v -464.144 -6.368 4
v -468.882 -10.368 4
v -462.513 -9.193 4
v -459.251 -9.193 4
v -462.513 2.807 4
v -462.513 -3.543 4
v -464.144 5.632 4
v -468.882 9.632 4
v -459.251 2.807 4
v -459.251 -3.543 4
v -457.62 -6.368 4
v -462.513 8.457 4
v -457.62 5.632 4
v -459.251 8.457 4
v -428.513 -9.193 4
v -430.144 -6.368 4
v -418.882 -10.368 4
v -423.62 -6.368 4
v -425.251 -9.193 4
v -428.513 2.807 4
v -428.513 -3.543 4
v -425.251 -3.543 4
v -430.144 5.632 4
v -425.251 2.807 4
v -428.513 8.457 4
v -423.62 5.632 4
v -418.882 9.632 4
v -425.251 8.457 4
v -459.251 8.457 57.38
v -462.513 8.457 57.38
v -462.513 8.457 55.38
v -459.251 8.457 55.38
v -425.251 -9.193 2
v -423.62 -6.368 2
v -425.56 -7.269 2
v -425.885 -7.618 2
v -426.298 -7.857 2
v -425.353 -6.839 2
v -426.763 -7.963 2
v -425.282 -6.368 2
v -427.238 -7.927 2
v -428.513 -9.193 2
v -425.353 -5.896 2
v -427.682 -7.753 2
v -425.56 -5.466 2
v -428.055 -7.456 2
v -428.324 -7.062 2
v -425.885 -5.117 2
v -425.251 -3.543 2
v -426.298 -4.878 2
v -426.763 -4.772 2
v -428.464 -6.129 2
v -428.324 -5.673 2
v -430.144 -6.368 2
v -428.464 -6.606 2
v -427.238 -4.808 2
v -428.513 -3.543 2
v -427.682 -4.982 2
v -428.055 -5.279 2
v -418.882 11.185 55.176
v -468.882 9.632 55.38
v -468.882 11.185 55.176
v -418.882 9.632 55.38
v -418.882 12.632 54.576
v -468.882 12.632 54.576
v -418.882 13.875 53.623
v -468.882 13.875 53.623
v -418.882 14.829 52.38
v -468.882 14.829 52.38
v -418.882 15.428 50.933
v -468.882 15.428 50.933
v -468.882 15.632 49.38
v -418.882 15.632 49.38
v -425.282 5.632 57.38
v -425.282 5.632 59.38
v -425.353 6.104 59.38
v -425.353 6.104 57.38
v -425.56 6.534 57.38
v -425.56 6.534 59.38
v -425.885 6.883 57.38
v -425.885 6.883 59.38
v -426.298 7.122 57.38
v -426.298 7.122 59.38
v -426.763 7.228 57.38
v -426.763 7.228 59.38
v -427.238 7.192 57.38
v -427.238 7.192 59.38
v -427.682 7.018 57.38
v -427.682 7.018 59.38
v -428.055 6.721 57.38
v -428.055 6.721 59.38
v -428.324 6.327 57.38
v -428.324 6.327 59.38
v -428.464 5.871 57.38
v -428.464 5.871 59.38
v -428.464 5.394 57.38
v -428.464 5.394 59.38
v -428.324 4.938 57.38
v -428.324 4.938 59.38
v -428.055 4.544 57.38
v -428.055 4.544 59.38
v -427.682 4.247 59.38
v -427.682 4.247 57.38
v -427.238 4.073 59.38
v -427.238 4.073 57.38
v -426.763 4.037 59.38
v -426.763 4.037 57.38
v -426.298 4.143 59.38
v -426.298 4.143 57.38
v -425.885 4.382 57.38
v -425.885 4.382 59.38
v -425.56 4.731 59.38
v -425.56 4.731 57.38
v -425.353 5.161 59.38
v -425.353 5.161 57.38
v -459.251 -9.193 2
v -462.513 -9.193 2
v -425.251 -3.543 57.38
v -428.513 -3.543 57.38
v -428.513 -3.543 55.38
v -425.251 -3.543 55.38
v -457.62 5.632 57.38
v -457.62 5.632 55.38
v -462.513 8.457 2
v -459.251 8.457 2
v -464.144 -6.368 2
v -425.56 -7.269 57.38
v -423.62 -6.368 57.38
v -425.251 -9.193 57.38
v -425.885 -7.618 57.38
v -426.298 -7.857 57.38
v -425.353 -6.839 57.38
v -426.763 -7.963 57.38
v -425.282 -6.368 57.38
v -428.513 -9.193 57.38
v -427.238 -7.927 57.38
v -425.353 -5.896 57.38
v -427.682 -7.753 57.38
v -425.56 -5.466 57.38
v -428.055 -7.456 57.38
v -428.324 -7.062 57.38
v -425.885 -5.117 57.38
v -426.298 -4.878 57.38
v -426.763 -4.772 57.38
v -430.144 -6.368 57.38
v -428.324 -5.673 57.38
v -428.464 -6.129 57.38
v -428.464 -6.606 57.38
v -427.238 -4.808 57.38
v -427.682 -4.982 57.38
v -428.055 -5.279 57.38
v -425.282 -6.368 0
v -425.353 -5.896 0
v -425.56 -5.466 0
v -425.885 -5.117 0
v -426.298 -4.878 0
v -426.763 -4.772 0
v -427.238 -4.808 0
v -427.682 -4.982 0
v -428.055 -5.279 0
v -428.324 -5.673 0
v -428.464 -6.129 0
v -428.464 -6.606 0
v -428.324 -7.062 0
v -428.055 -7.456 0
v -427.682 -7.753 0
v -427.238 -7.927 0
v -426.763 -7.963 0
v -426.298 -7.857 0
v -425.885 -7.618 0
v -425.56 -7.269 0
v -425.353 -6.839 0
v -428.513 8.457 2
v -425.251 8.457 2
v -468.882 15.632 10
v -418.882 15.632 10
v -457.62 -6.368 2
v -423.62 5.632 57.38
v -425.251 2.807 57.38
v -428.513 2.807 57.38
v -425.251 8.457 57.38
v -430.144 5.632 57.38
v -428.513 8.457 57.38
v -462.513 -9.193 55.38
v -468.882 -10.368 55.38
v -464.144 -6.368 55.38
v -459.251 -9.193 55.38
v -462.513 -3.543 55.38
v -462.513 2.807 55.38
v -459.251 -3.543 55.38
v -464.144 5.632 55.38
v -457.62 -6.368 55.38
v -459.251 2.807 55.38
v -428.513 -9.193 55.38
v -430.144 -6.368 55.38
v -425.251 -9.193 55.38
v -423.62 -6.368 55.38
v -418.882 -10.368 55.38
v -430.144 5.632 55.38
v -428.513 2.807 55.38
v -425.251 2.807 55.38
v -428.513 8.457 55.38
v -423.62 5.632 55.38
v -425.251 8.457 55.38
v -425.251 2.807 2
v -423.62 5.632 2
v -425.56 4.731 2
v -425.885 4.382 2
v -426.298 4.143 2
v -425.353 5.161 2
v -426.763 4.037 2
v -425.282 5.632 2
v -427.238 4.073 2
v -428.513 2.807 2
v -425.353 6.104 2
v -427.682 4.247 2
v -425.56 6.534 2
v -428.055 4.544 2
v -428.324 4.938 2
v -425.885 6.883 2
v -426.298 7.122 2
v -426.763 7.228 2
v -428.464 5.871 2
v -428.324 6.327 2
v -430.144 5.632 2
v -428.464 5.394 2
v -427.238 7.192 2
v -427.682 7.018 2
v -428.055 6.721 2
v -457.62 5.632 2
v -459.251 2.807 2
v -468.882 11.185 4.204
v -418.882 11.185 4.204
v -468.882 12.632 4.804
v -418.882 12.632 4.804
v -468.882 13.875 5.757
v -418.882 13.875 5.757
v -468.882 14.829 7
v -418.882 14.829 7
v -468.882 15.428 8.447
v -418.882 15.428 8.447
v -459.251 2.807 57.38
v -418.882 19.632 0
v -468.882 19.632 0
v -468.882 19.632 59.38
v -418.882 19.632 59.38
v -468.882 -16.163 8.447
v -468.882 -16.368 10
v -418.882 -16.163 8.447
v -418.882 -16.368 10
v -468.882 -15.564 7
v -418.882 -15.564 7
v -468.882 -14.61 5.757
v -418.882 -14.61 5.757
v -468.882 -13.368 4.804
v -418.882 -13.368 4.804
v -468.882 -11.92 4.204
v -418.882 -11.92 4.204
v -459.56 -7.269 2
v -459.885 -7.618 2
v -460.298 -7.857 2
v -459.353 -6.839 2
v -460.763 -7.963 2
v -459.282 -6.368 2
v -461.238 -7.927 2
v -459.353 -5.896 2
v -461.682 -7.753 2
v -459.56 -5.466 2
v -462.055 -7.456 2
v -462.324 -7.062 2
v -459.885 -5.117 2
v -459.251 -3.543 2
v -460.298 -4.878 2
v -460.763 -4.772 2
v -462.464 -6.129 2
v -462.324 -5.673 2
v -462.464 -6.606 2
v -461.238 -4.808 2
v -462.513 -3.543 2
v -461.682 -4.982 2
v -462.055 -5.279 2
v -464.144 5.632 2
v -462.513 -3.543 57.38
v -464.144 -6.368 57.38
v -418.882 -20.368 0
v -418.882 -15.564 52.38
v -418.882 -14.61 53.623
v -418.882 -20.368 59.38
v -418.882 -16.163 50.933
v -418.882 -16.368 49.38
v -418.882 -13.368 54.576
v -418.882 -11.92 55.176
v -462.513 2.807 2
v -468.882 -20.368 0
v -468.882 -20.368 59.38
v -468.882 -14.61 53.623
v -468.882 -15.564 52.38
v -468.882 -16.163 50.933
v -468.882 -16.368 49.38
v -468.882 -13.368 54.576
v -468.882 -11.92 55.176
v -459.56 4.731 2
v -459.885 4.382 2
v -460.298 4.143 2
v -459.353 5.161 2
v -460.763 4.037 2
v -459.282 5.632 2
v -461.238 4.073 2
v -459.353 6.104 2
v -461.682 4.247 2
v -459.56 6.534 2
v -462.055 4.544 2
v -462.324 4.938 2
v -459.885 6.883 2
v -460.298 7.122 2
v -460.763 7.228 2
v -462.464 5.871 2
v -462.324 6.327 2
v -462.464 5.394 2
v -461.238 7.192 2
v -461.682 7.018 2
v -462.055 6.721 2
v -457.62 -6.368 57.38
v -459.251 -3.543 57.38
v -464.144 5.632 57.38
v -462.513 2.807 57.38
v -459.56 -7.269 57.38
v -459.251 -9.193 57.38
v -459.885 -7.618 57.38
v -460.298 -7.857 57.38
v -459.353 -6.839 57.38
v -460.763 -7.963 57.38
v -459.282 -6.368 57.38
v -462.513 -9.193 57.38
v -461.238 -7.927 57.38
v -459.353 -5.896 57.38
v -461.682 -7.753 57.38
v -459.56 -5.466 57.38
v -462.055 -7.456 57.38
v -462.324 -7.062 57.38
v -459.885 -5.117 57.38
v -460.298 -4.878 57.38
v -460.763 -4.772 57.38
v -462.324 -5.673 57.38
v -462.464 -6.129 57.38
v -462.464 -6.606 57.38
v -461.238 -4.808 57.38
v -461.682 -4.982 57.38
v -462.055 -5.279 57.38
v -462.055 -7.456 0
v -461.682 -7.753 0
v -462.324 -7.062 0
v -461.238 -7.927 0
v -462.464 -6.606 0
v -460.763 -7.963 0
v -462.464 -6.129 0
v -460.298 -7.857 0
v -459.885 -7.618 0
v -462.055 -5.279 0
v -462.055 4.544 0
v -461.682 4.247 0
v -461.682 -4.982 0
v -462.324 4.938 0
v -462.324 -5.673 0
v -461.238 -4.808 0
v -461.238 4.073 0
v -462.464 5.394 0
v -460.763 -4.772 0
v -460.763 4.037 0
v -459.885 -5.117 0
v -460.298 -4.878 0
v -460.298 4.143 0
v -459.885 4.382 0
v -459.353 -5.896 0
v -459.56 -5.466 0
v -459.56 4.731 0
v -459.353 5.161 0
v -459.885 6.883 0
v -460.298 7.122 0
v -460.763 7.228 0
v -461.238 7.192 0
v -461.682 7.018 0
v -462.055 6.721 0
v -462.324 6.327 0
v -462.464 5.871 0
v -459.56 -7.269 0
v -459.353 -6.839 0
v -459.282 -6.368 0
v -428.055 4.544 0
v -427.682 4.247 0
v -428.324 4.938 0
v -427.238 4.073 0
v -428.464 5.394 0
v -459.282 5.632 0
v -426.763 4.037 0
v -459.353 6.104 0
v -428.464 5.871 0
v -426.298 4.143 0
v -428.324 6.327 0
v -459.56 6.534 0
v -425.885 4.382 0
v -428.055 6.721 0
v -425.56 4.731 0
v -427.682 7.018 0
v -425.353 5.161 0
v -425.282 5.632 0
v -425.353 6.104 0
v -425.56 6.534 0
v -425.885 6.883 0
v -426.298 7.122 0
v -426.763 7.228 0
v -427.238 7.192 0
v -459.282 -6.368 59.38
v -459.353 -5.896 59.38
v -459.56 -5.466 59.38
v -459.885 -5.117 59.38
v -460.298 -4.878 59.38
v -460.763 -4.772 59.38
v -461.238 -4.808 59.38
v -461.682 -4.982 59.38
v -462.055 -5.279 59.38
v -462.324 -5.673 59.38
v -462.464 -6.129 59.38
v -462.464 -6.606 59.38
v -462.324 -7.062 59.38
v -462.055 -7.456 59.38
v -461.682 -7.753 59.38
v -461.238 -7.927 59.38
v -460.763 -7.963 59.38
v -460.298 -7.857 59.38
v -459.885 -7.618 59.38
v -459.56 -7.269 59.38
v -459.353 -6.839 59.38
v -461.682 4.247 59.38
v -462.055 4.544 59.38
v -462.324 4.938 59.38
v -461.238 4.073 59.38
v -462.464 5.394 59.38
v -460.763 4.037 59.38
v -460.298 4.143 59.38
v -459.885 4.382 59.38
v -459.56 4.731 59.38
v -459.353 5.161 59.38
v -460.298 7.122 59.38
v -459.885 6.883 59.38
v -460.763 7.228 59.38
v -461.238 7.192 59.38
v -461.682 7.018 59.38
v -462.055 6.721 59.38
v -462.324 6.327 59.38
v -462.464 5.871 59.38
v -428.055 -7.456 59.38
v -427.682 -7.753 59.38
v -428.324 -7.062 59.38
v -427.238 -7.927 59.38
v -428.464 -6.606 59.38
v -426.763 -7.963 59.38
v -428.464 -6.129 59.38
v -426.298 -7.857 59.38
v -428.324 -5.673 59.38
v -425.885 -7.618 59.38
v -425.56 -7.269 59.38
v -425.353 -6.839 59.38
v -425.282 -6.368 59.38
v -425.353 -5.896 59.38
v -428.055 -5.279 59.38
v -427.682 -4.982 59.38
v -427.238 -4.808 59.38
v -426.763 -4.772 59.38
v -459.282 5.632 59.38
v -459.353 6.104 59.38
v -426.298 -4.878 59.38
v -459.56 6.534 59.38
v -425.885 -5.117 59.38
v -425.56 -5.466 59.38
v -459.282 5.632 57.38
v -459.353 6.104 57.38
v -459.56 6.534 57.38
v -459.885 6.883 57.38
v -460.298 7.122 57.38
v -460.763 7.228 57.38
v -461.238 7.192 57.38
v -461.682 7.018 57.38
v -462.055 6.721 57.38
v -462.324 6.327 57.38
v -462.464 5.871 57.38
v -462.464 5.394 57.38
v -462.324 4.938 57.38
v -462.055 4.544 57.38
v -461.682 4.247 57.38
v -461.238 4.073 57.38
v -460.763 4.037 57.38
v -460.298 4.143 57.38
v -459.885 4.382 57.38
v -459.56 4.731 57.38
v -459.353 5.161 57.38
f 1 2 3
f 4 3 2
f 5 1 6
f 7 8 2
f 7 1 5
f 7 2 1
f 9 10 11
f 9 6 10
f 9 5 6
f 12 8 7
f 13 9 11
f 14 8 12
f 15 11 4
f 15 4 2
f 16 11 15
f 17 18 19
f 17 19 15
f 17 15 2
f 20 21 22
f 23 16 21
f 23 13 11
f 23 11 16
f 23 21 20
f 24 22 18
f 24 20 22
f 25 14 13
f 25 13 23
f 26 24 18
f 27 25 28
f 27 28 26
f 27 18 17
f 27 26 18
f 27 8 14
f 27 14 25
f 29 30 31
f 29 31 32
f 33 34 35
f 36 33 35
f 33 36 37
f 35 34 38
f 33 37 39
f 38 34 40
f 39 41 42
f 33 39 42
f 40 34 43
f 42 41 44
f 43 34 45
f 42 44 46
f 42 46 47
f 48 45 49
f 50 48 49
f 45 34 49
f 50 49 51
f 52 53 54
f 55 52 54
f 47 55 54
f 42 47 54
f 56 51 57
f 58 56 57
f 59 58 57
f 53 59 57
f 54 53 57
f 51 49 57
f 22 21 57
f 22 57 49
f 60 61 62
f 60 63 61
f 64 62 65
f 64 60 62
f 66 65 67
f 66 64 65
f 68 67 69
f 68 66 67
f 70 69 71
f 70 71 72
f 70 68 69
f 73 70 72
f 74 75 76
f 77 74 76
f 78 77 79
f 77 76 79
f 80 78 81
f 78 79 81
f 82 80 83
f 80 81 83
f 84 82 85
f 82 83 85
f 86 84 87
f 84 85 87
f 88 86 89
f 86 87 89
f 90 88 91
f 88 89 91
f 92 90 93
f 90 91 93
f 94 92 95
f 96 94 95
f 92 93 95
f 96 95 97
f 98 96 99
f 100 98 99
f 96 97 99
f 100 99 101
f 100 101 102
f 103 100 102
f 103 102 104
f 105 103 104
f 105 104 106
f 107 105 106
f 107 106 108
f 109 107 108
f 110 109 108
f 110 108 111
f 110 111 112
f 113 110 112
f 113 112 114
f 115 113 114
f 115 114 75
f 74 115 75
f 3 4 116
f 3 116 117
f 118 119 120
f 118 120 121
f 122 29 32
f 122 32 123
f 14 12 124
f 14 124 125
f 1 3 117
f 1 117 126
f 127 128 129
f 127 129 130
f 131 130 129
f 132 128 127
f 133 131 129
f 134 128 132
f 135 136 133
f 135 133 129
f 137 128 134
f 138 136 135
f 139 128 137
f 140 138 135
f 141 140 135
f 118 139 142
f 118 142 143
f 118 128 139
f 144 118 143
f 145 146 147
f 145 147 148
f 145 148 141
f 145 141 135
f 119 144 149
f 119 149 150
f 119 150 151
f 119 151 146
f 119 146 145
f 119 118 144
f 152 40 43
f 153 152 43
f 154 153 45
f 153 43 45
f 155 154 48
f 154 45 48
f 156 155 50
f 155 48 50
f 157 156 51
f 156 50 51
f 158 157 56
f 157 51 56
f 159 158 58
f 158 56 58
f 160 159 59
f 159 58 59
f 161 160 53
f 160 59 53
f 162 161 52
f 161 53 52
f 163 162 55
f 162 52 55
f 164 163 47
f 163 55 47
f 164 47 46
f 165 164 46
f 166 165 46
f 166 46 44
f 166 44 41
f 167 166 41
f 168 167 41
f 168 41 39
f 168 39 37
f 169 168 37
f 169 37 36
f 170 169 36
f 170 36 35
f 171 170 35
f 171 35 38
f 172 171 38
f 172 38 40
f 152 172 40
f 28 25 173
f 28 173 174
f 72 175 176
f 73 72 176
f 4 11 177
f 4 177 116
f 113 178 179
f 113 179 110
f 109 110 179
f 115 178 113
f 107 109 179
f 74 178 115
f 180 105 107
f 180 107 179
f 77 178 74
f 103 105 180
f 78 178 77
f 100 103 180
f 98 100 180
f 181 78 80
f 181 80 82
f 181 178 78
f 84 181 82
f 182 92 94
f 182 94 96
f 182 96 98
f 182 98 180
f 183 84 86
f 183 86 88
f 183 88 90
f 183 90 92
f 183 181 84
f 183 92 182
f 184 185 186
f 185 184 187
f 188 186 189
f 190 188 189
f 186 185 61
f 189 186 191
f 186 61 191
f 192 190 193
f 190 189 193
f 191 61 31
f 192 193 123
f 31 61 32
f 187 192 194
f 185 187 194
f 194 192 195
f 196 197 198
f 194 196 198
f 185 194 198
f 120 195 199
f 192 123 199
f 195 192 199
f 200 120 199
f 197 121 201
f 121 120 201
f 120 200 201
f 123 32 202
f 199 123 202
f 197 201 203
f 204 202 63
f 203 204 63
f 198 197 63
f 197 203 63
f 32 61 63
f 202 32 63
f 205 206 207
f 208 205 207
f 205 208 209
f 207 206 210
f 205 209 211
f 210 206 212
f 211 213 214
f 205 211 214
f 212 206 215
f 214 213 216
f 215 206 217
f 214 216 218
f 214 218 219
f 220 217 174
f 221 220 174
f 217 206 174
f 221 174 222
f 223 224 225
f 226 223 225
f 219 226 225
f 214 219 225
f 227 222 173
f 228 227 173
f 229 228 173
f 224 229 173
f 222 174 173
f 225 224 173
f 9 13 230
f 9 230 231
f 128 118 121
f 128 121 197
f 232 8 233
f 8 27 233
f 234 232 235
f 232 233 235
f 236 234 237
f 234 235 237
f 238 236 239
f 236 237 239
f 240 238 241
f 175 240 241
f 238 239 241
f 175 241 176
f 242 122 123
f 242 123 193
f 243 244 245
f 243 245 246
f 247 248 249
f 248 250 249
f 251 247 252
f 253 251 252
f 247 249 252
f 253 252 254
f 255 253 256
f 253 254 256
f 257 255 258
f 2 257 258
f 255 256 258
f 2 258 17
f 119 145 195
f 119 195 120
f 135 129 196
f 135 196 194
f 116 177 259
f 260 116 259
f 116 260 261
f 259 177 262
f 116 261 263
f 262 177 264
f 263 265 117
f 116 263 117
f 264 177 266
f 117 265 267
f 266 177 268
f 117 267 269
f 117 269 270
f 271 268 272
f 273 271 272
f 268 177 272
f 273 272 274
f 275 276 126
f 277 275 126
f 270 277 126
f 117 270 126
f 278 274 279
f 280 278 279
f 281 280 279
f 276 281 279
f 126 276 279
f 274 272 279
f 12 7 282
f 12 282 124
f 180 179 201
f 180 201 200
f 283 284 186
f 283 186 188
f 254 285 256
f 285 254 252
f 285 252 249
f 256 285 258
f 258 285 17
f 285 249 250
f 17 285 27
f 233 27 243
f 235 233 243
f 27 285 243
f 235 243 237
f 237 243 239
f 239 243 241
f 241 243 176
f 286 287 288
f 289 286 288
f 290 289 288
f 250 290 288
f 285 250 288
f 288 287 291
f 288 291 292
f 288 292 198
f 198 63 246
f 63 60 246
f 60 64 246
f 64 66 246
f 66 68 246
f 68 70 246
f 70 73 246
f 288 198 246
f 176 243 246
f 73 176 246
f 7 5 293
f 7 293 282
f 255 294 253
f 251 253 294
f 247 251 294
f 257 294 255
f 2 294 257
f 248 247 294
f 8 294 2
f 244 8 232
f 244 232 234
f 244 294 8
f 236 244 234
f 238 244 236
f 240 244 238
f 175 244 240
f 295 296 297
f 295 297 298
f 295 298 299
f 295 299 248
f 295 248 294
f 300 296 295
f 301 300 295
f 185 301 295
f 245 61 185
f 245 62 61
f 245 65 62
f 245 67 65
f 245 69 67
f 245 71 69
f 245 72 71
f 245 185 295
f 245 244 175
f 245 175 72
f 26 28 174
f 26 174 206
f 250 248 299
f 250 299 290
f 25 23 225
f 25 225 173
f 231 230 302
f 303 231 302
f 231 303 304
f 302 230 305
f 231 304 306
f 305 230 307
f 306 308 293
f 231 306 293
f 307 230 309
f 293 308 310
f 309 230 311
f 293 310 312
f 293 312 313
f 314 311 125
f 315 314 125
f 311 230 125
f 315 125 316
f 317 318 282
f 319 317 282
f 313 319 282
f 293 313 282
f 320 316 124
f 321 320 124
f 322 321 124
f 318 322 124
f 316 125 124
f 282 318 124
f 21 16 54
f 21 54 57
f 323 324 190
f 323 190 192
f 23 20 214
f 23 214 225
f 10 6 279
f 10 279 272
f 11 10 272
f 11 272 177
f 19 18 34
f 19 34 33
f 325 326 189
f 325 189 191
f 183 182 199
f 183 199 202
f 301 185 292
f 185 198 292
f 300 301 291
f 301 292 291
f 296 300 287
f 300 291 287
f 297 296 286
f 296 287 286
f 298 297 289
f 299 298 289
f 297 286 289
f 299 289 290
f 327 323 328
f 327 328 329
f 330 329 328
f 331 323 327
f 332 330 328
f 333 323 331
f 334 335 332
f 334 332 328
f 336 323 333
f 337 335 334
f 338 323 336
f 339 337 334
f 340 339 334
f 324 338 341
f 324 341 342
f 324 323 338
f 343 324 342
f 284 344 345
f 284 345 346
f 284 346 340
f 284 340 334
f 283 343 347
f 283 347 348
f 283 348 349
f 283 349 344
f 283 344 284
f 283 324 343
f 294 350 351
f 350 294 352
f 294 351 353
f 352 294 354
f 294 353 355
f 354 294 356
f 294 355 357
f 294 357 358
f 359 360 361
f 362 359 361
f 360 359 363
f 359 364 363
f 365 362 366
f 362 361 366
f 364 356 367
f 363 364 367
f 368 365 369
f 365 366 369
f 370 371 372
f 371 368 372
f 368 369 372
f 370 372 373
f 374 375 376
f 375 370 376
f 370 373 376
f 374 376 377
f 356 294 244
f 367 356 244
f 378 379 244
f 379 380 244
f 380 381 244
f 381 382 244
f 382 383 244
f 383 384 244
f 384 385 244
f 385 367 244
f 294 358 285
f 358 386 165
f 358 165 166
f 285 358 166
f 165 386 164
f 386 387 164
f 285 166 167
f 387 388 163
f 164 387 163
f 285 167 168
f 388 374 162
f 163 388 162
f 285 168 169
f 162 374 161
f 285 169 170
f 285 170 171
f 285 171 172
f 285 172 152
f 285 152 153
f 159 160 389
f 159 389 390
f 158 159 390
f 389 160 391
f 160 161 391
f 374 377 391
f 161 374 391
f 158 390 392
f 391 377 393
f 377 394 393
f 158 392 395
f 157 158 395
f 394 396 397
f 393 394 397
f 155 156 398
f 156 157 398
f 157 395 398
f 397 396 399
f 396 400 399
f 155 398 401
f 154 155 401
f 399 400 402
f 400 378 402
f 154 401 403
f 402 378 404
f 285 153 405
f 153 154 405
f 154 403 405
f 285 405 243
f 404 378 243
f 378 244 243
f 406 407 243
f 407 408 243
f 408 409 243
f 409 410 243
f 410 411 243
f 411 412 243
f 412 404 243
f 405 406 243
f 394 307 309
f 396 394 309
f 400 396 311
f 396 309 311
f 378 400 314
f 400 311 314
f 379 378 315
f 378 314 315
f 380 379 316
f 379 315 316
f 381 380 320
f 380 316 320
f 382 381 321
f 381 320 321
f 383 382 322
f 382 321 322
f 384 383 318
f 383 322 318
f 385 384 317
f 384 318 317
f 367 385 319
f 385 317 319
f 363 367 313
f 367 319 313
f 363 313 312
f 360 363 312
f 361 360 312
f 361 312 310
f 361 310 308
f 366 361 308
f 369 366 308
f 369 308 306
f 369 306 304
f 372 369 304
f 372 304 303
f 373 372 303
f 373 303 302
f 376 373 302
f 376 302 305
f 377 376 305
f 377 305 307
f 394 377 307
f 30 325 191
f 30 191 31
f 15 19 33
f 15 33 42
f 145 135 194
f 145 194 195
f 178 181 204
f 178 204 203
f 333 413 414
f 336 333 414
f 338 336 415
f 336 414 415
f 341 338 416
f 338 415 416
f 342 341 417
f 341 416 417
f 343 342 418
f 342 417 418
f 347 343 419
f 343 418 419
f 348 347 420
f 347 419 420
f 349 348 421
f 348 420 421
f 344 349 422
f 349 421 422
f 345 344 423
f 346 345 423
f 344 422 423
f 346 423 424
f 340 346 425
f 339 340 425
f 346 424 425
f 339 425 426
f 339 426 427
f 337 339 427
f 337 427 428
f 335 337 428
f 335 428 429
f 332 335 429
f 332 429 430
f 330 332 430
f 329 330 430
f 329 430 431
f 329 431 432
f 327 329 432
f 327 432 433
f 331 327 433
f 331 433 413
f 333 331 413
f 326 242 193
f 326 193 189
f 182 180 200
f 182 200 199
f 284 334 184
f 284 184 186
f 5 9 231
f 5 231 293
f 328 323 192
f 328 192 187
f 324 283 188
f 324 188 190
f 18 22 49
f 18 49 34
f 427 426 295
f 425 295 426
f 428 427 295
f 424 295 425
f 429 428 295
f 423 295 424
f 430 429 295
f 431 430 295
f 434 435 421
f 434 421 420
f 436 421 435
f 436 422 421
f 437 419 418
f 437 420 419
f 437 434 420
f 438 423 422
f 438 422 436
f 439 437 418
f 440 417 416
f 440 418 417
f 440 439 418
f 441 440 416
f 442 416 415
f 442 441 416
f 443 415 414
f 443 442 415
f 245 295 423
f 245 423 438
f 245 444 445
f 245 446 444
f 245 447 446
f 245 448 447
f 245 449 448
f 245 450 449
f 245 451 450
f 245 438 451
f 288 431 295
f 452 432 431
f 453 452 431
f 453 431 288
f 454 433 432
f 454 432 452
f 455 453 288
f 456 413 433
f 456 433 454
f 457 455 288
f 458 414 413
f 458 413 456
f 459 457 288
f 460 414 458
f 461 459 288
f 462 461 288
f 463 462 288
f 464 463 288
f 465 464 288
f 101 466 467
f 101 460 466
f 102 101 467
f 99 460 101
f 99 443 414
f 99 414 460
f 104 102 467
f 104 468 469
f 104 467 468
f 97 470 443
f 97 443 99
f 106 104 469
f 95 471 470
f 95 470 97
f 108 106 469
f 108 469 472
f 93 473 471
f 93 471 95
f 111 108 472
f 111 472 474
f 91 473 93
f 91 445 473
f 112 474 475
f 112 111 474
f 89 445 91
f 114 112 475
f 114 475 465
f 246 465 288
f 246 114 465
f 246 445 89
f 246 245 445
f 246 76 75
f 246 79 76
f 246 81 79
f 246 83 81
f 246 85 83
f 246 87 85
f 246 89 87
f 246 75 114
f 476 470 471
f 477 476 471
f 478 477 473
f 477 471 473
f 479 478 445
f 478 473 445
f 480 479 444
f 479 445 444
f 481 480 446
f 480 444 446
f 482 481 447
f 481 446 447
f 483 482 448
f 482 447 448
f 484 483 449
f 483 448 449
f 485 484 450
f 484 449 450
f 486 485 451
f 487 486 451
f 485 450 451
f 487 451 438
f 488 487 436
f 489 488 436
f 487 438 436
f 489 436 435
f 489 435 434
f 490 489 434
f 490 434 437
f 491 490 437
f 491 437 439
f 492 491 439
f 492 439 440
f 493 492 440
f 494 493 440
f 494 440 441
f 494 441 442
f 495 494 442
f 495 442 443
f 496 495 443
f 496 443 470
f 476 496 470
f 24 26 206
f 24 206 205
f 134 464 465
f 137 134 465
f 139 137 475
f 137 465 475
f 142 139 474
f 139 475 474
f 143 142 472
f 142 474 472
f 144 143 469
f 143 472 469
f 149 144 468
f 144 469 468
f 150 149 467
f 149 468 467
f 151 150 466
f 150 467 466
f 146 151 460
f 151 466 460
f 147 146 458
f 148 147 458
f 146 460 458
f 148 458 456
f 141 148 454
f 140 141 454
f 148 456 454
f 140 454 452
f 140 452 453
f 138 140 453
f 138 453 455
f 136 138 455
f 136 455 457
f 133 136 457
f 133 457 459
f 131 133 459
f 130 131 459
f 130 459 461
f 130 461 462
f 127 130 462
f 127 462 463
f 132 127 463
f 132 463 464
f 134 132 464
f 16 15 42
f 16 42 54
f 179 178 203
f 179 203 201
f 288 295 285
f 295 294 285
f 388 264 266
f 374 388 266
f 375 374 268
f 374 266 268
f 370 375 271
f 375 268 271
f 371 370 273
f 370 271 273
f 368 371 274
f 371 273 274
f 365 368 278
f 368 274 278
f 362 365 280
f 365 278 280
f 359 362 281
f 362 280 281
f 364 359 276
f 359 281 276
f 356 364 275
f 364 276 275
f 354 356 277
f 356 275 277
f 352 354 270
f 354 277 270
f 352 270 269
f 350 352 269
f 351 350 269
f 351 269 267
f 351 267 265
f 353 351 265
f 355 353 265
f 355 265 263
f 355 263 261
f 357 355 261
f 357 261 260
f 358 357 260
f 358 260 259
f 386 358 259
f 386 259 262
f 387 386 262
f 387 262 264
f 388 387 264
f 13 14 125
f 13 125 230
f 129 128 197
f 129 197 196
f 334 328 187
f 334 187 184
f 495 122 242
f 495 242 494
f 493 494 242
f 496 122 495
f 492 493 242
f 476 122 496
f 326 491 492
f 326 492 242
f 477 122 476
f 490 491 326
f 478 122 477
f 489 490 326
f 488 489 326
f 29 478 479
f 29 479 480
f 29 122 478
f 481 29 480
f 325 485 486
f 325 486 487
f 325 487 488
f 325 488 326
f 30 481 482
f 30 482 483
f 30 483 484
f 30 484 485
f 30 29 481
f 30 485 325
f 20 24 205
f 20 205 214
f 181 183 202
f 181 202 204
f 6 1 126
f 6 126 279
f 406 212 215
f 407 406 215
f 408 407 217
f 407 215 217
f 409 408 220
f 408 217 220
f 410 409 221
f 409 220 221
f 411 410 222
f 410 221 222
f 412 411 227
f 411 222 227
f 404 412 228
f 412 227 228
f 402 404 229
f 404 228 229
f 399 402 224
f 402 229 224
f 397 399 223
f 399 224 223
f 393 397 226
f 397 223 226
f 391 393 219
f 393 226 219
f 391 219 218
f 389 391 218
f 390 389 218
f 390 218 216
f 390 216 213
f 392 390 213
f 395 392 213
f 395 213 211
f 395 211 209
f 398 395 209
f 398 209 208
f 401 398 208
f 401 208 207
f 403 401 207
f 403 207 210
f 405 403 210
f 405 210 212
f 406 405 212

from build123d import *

# Parameters (mm, degrees)
SKETCH1_W               = 50
SKETCH1_H               = 40
BOSS_EXTRUDE1_DEPTH     = 4
SKETCH2_W               = 50
SKETCH2_H               = 4
BOSS_EXTRUDE2_DEPTH     = 55.38
SKETCH4_W               = 50
SKETCH4_H               = 4
BOSS_EXTRUDE3_DEPTH     = 32
SKETCH5_R               = 1.6
CUT_EXTRUDE1_DEPTH      = 1
CUT_EXTRUDE1_DEPTH_BACK = 60.38
CUT_EXTRUDE2_START      = -2
CUT_EXTRUDE2_DEPTH      = 55.38
FILLET1_R               = 6


with BuildPart() as part:
    # Sketch1 → Boss-Extrude1 (new body)
    with BuildSketch(Plane.XY):
        with Locations((-443.882332823, -0.367507575)):
            Rectangle(SKETCH1_W, SKETCH1_H)
    extrude(amount=BOSS_EXTRUDE1_DEPTH)

    # Sketch2 → Boss-Extrude2 (add)
    with BuildSketch(Plane.XY.offset(4)):
        with Locations((-443.882332823, -18.367507575)):
            Rectangle(SKETCH2_W, SKETCH2_H)
        with Locations((-443.882332823, 17.632492425)):
            Rectangle(SKETCH2_W, SKETCH2_H)
    extrude(amount=BOSS_EXTRUDE2_DEPTH)

    # Sketch4 → Boss-Extrude3 (add)
    with BuildSketch(Plane.XZ.offset(-15.632492425)):
        with Locations((-443.882332823, 57.38)):
            Rectangle(SKETCH4_W, SKETCH4_H)
    extrude(amount=BOSS_EXTRUDE3_DEPTH)

    # Sketch5 → Cut-Extrude1 (cut, two sides)
    with BuildSketch(Plane.XY.offset(59.38)) as cut_extrude1_sk:
        with Locations((-460.882332823, -6.367507575)):
            Circle(SKETCH5_R)
        with Locations((-460.882332823, 5.632492425)):
            Circle(SKETCH5_R)
        with Locations((-426.882332823, -6.367507575)):
            Circle(SKETCH5_R)
        with Locations((-426.882332823, 5.632492425)):
            Circle(SKETCH5_R)
    extrude(amount=CUT_EXTRUDE1_DEPTH, mode=Mode.SUBTRACT)
    extrude(cut_extrude1_sk.sketch, amount=-CUT_EXTRUDE1_DEPTH_BACK, mode=Mode.SUBTRACT)

    # Sketch6 → Cut-Extrude2 (cut)
    with BuildSketch(Plane(origin=(0, 0, 55.38), x_dir=(-1, 0, 0), z_dir=(0, 0, -1)).offset(CUT_EXTRUDE2_START)):
        Polygon((457.620303802, 5.632492425), (459.251318313, 2.807492425), (462.513347334, 2.807492425), (464.144361844, 5.632492425), (462.513347334, 8.457492425), (459.251318313, 8.457492425), align=None)
        Polygon((457.620303802, -6.367507575), (459.251318313, -9.192507575), (462.513347334, -9.192507575), (464.144361844, -6.367507575), (462.513347334, -3.542507575), (459.251318313, -3.542507575), align=None)
        Polygon((425.251318313, 2.807492425), (428.513347334, 2.807492425), (430.144361844, 5.632492425), (428.513347334, 8.457492425), (425.251318313, 8.457492425), (423.620303802, 5.632492425), align=None)
        Polygon((423.620303802, -6.367507575), (425.251318313, -9.192507575), (428.513347334, -9.192507575), (430.144361844, -6.367507575), (428.513347334, -3.542507575), (425.251318313, -3.542507575), align=None)
    extrude(amount=CUT_EXTRUDE2_DEPTH, mode=Mode.SUBTRACT)

    # Fillet1
    fillet1_edges = [part.edges().sort_by_distance(p)[0] for p in [
        (-443.882332823, -16.367507575, 4),
        (-443.882332823, 15.632492425, 4),
        (-443.882332823, 15.632492425, 55.38),
        (-443.882332823, -16.367507575, 55.38),
    ]]
    fillet(fillet1_edges, radius=FILLET1_R)


solid = part.part
